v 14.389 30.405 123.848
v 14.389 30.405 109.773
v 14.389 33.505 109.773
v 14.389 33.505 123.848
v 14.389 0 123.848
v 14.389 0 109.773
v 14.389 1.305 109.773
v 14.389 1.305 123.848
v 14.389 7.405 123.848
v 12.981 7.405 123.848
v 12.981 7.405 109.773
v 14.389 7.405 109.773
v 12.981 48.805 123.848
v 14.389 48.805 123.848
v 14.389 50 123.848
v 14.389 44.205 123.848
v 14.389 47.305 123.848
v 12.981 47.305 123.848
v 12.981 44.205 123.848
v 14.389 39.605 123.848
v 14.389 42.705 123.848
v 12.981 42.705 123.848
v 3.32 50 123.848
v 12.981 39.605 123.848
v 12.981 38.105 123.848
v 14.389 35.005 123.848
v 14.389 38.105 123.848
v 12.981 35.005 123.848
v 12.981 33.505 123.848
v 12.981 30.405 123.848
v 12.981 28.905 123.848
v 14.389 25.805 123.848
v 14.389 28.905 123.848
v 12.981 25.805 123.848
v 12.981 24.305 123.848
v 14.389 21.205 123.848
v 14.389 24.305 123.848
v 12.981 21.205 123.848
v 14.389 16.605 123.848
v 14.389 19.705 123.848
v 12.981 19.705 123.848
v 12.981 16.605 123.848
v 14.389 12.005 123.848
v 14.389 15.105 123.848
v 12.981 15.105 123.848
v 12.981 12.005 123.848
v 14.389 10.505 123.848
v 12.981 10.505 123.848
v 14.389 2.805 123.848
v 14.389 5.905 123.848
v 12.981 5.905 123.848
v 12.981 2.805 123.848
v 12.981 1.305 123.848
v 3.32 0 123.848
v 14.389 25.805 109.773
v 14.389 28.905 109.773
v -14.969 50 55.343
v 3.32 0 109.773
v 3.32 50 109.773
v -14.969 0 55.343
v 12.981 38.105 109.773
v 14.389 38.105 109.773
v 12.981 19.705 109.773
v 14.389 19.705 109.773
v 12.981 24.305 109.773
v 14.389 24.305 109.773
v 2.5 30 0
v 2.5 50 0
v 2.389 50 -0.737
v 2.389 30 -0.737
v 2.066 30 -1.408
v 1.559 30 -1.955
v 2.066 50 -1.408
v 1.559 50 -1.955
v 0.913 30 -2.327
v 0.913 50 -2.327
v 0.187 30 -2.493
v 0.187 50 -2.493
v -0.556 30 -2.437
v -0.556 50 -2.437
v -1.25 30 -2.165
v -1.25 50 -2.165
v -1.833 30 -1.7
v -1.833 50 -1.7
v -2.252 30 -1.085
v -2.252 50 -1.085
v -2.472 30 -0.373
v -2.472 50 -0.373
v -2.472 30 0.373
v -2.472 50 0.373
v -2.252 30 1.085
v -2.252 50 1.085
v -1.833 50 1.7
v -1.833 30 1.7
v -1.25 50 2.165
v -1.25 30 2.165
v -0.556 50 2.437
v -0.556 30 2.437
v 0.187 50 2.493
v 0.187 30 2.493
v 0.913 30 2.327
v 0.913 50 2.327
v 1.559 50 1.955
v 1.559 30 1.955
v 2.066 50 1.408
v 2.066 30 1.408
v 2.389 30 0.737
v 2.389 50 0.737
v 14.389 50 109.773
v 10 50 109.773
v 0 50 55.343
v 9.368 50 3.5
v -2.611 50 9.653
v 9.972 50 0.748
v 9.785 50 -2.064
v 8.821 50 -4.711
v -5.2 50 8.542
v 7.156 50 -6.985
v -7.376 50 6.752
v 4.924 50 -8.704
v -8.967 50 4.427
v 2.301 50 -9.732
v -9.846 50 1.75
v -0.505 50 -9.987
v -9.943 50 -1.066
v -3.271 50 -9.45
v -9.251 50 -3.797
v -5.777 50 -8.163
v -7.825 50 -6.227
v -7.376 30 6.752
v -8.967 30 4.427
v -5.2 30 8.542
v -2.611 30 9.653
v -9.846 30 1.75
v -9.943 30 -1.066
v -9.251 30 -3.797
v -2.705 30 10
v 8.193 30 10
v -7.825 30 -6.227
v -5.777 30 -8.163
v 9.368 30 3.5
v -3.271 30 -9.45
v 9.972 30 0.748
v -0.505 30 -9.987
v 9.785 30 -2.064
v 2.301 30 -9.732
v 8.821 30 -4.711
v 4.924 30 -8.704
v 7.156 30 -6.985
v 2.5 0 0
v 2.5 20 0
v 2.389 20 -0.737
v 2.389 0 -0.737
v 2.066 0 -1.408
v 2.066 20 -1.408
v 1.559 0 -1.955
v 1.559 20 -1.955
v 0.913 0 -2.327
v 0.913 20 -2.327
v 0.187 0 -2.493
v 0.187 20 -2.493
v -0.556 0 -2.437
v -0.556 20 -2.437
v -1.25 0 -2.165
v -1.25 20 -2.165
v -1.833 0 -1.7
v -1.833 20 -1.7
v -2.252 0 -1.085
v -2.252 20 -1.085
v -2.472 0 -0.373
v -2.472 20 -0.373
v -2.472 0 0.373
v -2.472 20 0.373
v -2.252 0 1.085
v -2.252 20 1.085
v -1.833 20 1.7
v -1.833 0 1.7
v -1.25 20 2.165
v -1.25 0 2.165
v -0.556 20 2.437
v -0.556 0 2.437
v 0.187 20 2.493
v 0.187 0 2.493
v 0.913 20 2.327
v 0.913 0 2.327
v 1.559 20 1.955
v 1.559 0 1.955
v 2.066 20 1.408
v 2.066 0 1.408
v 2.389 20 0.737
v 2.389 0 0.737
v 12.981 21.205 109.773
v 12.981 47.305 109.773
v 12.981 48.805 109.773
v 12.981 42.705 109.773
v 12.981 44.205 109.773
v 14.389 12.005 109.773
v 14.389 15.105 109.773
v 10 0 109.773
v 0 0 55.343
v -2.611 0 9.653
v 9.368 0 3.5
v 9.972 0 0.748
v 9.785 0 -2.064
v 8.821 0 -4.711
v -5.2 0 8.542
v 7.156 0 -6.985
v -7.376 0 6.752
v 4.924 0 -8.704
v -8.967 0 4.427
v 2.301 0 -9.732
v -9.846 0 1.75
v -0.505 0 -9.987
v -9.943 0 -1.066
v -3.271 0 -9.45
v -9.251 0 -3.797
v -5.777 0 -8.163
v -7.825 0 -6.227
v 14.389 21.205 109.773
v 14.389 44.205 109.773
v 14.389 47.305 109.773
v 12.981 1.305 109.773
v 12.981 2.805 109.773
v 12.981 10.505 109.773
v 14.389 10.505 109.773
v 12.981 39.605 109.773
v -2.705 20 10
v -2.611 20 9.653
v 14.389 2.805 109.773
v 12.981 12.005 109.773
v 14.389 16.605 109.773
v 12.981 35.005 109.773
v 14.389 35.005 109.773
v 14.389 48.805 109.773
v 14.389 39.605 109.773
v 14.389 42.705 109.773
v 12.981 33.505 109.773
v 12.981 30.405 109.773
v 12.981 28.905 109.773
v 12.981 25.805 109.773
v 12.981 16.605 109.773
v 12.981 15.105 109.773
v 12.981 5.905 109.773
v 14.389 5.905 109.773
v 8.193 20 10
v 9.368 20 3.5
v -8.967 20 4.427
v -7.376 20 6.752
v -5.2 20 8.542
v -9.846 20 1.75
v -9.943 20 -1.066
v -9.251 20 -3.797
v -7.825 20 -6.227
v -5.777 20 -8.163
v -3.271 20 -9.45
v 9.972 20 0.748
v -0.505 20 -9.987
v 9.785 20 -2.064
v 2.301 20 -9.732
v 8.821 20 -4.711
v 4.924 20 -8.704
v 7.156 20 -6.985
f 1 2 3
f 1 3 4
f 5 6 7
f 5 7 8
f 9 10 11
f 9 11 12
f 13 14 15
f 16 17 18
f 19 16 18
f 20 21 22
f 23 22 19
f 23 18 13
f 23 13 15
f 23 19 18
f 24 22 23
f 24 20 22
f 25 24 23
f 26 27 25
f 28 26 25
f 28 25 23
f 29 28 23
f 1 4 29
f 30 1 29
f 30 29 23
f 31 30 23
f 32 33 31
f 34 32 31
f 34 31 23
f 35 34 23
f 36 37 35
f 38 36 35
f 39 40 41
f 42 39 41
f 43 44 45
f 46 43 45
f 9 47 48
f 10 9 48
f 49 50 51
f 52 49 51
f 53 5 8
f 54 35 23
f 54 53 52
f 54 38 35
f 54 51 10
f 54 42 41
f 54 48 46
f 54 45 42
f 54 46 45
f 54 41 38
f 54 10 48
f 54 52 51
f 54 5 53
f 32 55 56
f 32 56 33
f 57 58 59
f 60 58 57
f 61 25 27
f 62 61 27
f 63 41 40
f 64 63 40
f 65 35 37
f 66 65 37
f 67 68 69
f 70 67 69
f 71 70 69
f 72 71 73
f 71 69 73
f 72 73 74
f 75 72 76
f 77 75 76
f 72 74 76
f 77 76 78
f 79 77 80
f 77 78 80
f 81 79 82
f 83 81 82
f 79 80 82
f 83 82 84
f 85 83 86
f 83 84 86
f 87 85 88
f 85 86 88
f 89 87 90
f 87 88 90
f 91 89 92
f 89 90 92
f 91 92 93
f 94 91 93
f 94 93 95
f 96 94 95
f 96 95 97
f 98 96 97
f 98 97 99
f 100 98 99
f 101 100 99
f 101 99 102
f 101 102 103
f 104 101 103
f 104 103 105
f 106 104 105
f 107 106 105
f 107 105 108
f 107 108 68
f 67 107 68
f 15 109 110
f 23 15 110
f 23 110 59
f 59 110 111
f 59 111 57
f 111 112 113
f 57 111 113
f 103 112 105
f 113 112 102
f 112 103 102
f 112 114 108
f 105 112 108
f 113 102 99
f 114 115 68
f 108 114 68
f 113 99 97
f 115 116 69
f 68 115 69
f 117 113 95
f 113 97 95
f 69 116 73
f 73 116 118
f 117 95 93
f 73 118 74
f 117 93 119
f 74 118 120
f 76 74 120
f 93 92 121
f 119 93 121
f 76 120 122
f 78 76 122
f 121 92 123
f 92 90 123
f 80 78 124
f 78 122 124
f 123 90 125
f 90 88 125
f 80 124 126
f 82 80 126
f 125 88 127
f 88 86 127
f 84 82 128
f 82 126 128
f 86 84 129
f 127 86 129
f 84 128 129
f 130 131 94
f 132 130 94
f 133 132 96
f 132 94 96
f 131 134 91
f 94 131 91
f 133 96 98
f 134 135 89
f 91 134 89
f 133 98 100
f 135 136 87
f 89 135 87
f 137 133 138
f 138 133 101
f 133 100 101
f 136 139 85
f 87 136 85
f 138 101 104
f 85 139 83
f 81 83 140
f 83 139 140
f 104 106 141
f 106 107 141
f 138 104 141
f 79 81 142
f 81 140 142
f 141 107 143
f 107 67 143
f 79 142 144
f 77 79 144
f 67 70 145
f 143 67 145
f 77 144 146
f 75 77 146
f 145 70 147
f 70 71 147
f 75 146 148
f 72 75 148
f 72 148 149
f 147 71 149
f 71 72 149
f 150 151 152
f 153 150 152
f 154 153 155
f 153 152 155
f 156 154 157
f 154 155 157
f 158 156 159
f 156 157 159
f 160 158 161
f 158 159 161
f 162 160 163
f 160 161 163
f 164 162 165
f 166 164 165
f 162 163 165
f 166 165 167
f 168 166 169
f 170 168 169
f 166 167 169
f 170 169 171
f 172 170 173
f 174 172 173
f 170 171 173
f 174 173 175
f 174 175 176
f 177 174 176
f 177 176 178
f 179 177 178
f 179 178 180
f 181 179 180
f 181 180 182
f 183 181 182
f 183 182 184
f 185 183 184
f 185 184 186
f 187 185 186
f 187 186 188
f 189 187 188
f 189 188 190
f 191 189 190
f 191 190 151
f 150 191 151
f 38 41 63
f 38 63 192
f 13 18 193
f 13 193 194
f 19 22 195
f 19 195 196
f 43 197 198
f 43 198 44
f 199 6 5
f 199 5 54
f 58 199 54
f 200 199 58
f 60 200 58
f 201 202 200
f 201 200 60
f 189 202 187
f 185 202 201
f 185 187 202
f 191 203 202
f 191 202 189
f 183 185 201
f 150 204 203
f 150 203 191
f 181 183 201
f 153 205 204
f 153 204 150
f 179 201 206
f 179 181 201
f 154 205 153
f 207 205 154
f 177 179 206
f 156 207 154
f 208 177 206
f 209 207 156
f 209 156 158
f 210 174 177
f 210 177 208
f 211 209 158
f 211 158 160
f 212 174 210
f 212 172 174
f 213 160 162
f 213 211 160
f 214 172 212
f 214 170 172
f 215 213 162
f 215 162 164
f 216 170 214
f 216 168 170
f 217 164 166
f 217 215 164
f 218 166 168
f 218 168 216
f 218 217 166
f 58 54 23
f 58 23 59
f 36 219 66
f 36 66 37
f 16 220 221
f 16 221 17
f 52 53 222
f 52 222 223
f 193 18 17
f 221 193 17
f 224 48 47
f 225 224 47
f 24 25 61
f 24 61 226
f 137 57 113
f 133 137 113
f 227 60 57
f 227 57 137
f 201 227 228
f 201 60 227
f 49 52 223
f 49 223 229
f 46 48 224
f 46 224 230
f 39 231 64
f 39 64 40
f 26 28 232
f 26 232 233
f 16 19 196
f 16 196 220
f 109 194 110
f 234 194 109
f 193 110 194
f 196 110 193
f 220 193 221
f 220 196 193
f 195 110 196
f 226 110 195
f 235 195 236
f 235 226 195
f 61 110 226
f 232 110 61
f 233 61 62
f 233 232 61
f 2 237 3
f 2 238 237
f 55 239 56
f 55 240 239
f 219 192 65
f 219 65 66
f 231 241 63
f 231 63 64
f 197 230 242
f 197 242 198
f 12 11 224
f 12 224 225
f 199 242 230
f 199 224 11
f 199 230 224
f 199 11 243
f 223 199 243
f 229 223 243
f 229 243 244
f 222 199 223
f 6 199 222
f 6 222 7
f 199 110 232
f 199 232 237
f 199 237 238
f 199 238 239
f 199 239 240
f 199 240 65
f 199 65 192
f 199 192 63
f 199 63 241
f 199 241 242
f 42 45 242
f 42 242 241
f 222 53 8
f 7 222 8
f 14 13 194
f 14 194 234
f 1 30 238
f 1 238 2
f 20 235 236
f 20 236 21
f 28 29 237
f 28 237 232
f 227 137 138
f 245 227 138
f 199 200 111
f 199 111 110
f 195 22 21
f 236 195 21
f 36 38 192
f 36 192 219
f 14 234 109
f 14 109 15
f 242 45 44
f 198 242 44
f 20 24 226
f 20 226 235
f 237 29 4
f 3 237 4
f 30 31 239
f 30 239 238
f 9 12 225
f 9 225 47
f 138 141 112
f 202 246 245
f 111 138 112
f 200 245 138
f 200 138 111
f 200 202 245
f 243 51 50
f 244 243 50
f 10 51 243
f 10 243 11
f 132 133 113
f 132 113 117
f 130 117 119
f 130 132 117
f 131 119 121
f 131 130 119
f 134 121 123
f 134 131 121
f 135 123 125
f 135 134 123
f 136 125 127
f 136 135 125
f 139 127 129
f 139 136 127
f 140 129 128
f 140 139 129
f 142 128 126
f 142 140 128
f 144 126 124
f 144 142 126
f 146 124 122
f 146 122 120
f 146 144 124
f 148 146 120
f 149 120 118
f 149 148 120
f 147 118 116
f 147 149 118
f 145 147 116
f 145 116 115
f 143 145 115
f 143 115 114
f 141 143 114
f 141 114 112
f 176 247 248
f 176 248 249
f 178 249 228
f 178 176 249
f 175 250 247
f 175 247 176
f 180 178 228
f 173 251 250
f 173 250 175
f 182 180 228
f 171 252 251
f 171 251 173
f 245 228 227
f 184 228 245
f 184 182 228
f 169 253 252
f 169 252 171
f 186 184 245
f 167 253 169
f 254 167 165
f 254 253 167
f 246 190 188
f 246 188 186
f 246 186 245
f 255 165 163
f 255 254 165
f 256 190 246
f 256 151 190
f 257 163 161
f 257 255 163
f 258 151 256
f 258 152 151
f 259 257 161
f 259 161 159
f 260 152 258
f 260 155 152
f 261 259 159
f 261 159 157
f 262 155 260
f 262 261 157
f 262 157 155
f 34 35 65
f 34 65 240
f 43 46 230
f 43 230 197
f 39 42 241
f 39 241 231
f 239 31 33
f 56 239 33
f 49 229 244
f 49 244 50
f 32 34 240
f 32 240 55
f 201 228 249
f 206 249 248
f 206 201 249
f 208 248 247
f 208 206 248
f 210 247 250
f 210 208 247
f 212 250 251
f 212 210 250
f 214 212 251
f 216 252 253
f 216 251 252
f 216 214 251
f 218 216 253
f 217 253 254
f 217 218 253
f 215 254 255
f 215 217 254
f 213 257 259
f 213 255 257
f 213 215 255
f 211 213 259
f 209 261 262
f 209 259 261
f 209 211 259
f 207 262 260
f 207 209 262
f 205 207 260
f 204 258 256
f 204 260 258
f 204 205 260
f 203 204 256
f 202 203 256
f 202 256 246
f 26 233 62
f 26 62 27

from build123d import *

# Parameters (mm, degrees)
BOSS_EXTRUDE1_DEPTH     = 50
SKETCH2_R               = 2.5
CUT_EXTRUDE1_DEPTH      = 50
SKETCH3_W               = 40
SKETCH3_H               = 10
CUT_EXTRUDE2_DEPTH      = 10
CUT_EXTRUDE2_DEPTH_BACK = 50
SKETCH4_W               = 1.407970845
SKETCH4_H               = 1.5
CUT_EXTRUDE3_DEPTH      = 50
LPATTERN1_COUNT         = 20
LPATTERN1_PITCH         = 4.6


with BuildPart() as part:
    # Sketch1 → Boss-Extrude1 (new body)
    with BuildSketch(Plane(origin=(0, 0, 0), x_dir=(1, 0, 0), z_dir=(0, 1, 0))):
        with BuildLine():
            Line((9.367667652, -3.499543222), (0.000115688, -55.342775793))
            Line((0.000115688, -55.342775793), (10, -109.773324045))
            Line((10, -109.773324045), (14.389217383, -109.773324045))
            Line((14.389217383, -109.773324045), (14.389217383, -123.847521807))
            Line((14.389217383, -123.847521807), (10, -123.847521807))
            Line((10, -123.847521807), (3.320195055, -123.847521807))
            Line((3.320195055, -123.847521807), (3.320195055, -109.773324045))
            Line((3.320195055, -109.773324045), (-14.969009399, -55.342775793))
            Line((-14.969009399, -55.342775793), (-2.61095993, -9.653128417))
            ThreePointArc((-2.61095993, -9.653128417), (-4.56945593, 8.894946459), (9.367667652, -3.499543222))
        make_face()
    extrude(amount=BOSS_EXTRUDE1_DEPTH)

    # Sketch2 → Cut-Extrude1 (cut)
    with BuildSketch(Plane(origin=(0, 50, 0), x_dir=(1, 0, 0), z_dir=(0, 1, 0))):
        Circle(SKETCH2_R)
    extrude(amount=-CUT_EXTRUDE1_DEPTH, mode=Mode.SUBTRACT)

    # Sketch3 → Cut-Extrude2 (cut, two sides)
    with BuildSketch(Plane.XY) as cut_extrude2_sk:
        with Locations((10, 25)):
            Rectangle(SKETCH3_W, SKETCH3_H)
    extrude(amount=CUT_EXTRUDE2_DEPTH, mode=Mode.SUBTRACT)
    extrude(cut_extrude2_sk.sketch, amount=-CUT_EXTRUDE2_DEPTH_BACK, mode=Mode.SUBTRACT)

    # Sketch4 → Cut-Extrude3 (cut)
    with BuildSketch(Plane.XY.offset(123.847521807)):
        with Locations((13.685231961, 48.055062802)):
            Rectangle(SKETCH4_W, SKETCH4_H)
    cut_extrude3 = extrude(amount=-CUT_EXTRUDE3_DEPTH, mode=Mode.SUBTRACT)

    # LPattern1: Cut-Extrude3 ×20
    with Locations(*[(0, -i * LPATTERN1_PITCH, 0) for i in range(1, LPATTERN1_COUNT)]):
        add(cut_extrude3, mode=Mode.SUBTRACT)


solid = part.part
